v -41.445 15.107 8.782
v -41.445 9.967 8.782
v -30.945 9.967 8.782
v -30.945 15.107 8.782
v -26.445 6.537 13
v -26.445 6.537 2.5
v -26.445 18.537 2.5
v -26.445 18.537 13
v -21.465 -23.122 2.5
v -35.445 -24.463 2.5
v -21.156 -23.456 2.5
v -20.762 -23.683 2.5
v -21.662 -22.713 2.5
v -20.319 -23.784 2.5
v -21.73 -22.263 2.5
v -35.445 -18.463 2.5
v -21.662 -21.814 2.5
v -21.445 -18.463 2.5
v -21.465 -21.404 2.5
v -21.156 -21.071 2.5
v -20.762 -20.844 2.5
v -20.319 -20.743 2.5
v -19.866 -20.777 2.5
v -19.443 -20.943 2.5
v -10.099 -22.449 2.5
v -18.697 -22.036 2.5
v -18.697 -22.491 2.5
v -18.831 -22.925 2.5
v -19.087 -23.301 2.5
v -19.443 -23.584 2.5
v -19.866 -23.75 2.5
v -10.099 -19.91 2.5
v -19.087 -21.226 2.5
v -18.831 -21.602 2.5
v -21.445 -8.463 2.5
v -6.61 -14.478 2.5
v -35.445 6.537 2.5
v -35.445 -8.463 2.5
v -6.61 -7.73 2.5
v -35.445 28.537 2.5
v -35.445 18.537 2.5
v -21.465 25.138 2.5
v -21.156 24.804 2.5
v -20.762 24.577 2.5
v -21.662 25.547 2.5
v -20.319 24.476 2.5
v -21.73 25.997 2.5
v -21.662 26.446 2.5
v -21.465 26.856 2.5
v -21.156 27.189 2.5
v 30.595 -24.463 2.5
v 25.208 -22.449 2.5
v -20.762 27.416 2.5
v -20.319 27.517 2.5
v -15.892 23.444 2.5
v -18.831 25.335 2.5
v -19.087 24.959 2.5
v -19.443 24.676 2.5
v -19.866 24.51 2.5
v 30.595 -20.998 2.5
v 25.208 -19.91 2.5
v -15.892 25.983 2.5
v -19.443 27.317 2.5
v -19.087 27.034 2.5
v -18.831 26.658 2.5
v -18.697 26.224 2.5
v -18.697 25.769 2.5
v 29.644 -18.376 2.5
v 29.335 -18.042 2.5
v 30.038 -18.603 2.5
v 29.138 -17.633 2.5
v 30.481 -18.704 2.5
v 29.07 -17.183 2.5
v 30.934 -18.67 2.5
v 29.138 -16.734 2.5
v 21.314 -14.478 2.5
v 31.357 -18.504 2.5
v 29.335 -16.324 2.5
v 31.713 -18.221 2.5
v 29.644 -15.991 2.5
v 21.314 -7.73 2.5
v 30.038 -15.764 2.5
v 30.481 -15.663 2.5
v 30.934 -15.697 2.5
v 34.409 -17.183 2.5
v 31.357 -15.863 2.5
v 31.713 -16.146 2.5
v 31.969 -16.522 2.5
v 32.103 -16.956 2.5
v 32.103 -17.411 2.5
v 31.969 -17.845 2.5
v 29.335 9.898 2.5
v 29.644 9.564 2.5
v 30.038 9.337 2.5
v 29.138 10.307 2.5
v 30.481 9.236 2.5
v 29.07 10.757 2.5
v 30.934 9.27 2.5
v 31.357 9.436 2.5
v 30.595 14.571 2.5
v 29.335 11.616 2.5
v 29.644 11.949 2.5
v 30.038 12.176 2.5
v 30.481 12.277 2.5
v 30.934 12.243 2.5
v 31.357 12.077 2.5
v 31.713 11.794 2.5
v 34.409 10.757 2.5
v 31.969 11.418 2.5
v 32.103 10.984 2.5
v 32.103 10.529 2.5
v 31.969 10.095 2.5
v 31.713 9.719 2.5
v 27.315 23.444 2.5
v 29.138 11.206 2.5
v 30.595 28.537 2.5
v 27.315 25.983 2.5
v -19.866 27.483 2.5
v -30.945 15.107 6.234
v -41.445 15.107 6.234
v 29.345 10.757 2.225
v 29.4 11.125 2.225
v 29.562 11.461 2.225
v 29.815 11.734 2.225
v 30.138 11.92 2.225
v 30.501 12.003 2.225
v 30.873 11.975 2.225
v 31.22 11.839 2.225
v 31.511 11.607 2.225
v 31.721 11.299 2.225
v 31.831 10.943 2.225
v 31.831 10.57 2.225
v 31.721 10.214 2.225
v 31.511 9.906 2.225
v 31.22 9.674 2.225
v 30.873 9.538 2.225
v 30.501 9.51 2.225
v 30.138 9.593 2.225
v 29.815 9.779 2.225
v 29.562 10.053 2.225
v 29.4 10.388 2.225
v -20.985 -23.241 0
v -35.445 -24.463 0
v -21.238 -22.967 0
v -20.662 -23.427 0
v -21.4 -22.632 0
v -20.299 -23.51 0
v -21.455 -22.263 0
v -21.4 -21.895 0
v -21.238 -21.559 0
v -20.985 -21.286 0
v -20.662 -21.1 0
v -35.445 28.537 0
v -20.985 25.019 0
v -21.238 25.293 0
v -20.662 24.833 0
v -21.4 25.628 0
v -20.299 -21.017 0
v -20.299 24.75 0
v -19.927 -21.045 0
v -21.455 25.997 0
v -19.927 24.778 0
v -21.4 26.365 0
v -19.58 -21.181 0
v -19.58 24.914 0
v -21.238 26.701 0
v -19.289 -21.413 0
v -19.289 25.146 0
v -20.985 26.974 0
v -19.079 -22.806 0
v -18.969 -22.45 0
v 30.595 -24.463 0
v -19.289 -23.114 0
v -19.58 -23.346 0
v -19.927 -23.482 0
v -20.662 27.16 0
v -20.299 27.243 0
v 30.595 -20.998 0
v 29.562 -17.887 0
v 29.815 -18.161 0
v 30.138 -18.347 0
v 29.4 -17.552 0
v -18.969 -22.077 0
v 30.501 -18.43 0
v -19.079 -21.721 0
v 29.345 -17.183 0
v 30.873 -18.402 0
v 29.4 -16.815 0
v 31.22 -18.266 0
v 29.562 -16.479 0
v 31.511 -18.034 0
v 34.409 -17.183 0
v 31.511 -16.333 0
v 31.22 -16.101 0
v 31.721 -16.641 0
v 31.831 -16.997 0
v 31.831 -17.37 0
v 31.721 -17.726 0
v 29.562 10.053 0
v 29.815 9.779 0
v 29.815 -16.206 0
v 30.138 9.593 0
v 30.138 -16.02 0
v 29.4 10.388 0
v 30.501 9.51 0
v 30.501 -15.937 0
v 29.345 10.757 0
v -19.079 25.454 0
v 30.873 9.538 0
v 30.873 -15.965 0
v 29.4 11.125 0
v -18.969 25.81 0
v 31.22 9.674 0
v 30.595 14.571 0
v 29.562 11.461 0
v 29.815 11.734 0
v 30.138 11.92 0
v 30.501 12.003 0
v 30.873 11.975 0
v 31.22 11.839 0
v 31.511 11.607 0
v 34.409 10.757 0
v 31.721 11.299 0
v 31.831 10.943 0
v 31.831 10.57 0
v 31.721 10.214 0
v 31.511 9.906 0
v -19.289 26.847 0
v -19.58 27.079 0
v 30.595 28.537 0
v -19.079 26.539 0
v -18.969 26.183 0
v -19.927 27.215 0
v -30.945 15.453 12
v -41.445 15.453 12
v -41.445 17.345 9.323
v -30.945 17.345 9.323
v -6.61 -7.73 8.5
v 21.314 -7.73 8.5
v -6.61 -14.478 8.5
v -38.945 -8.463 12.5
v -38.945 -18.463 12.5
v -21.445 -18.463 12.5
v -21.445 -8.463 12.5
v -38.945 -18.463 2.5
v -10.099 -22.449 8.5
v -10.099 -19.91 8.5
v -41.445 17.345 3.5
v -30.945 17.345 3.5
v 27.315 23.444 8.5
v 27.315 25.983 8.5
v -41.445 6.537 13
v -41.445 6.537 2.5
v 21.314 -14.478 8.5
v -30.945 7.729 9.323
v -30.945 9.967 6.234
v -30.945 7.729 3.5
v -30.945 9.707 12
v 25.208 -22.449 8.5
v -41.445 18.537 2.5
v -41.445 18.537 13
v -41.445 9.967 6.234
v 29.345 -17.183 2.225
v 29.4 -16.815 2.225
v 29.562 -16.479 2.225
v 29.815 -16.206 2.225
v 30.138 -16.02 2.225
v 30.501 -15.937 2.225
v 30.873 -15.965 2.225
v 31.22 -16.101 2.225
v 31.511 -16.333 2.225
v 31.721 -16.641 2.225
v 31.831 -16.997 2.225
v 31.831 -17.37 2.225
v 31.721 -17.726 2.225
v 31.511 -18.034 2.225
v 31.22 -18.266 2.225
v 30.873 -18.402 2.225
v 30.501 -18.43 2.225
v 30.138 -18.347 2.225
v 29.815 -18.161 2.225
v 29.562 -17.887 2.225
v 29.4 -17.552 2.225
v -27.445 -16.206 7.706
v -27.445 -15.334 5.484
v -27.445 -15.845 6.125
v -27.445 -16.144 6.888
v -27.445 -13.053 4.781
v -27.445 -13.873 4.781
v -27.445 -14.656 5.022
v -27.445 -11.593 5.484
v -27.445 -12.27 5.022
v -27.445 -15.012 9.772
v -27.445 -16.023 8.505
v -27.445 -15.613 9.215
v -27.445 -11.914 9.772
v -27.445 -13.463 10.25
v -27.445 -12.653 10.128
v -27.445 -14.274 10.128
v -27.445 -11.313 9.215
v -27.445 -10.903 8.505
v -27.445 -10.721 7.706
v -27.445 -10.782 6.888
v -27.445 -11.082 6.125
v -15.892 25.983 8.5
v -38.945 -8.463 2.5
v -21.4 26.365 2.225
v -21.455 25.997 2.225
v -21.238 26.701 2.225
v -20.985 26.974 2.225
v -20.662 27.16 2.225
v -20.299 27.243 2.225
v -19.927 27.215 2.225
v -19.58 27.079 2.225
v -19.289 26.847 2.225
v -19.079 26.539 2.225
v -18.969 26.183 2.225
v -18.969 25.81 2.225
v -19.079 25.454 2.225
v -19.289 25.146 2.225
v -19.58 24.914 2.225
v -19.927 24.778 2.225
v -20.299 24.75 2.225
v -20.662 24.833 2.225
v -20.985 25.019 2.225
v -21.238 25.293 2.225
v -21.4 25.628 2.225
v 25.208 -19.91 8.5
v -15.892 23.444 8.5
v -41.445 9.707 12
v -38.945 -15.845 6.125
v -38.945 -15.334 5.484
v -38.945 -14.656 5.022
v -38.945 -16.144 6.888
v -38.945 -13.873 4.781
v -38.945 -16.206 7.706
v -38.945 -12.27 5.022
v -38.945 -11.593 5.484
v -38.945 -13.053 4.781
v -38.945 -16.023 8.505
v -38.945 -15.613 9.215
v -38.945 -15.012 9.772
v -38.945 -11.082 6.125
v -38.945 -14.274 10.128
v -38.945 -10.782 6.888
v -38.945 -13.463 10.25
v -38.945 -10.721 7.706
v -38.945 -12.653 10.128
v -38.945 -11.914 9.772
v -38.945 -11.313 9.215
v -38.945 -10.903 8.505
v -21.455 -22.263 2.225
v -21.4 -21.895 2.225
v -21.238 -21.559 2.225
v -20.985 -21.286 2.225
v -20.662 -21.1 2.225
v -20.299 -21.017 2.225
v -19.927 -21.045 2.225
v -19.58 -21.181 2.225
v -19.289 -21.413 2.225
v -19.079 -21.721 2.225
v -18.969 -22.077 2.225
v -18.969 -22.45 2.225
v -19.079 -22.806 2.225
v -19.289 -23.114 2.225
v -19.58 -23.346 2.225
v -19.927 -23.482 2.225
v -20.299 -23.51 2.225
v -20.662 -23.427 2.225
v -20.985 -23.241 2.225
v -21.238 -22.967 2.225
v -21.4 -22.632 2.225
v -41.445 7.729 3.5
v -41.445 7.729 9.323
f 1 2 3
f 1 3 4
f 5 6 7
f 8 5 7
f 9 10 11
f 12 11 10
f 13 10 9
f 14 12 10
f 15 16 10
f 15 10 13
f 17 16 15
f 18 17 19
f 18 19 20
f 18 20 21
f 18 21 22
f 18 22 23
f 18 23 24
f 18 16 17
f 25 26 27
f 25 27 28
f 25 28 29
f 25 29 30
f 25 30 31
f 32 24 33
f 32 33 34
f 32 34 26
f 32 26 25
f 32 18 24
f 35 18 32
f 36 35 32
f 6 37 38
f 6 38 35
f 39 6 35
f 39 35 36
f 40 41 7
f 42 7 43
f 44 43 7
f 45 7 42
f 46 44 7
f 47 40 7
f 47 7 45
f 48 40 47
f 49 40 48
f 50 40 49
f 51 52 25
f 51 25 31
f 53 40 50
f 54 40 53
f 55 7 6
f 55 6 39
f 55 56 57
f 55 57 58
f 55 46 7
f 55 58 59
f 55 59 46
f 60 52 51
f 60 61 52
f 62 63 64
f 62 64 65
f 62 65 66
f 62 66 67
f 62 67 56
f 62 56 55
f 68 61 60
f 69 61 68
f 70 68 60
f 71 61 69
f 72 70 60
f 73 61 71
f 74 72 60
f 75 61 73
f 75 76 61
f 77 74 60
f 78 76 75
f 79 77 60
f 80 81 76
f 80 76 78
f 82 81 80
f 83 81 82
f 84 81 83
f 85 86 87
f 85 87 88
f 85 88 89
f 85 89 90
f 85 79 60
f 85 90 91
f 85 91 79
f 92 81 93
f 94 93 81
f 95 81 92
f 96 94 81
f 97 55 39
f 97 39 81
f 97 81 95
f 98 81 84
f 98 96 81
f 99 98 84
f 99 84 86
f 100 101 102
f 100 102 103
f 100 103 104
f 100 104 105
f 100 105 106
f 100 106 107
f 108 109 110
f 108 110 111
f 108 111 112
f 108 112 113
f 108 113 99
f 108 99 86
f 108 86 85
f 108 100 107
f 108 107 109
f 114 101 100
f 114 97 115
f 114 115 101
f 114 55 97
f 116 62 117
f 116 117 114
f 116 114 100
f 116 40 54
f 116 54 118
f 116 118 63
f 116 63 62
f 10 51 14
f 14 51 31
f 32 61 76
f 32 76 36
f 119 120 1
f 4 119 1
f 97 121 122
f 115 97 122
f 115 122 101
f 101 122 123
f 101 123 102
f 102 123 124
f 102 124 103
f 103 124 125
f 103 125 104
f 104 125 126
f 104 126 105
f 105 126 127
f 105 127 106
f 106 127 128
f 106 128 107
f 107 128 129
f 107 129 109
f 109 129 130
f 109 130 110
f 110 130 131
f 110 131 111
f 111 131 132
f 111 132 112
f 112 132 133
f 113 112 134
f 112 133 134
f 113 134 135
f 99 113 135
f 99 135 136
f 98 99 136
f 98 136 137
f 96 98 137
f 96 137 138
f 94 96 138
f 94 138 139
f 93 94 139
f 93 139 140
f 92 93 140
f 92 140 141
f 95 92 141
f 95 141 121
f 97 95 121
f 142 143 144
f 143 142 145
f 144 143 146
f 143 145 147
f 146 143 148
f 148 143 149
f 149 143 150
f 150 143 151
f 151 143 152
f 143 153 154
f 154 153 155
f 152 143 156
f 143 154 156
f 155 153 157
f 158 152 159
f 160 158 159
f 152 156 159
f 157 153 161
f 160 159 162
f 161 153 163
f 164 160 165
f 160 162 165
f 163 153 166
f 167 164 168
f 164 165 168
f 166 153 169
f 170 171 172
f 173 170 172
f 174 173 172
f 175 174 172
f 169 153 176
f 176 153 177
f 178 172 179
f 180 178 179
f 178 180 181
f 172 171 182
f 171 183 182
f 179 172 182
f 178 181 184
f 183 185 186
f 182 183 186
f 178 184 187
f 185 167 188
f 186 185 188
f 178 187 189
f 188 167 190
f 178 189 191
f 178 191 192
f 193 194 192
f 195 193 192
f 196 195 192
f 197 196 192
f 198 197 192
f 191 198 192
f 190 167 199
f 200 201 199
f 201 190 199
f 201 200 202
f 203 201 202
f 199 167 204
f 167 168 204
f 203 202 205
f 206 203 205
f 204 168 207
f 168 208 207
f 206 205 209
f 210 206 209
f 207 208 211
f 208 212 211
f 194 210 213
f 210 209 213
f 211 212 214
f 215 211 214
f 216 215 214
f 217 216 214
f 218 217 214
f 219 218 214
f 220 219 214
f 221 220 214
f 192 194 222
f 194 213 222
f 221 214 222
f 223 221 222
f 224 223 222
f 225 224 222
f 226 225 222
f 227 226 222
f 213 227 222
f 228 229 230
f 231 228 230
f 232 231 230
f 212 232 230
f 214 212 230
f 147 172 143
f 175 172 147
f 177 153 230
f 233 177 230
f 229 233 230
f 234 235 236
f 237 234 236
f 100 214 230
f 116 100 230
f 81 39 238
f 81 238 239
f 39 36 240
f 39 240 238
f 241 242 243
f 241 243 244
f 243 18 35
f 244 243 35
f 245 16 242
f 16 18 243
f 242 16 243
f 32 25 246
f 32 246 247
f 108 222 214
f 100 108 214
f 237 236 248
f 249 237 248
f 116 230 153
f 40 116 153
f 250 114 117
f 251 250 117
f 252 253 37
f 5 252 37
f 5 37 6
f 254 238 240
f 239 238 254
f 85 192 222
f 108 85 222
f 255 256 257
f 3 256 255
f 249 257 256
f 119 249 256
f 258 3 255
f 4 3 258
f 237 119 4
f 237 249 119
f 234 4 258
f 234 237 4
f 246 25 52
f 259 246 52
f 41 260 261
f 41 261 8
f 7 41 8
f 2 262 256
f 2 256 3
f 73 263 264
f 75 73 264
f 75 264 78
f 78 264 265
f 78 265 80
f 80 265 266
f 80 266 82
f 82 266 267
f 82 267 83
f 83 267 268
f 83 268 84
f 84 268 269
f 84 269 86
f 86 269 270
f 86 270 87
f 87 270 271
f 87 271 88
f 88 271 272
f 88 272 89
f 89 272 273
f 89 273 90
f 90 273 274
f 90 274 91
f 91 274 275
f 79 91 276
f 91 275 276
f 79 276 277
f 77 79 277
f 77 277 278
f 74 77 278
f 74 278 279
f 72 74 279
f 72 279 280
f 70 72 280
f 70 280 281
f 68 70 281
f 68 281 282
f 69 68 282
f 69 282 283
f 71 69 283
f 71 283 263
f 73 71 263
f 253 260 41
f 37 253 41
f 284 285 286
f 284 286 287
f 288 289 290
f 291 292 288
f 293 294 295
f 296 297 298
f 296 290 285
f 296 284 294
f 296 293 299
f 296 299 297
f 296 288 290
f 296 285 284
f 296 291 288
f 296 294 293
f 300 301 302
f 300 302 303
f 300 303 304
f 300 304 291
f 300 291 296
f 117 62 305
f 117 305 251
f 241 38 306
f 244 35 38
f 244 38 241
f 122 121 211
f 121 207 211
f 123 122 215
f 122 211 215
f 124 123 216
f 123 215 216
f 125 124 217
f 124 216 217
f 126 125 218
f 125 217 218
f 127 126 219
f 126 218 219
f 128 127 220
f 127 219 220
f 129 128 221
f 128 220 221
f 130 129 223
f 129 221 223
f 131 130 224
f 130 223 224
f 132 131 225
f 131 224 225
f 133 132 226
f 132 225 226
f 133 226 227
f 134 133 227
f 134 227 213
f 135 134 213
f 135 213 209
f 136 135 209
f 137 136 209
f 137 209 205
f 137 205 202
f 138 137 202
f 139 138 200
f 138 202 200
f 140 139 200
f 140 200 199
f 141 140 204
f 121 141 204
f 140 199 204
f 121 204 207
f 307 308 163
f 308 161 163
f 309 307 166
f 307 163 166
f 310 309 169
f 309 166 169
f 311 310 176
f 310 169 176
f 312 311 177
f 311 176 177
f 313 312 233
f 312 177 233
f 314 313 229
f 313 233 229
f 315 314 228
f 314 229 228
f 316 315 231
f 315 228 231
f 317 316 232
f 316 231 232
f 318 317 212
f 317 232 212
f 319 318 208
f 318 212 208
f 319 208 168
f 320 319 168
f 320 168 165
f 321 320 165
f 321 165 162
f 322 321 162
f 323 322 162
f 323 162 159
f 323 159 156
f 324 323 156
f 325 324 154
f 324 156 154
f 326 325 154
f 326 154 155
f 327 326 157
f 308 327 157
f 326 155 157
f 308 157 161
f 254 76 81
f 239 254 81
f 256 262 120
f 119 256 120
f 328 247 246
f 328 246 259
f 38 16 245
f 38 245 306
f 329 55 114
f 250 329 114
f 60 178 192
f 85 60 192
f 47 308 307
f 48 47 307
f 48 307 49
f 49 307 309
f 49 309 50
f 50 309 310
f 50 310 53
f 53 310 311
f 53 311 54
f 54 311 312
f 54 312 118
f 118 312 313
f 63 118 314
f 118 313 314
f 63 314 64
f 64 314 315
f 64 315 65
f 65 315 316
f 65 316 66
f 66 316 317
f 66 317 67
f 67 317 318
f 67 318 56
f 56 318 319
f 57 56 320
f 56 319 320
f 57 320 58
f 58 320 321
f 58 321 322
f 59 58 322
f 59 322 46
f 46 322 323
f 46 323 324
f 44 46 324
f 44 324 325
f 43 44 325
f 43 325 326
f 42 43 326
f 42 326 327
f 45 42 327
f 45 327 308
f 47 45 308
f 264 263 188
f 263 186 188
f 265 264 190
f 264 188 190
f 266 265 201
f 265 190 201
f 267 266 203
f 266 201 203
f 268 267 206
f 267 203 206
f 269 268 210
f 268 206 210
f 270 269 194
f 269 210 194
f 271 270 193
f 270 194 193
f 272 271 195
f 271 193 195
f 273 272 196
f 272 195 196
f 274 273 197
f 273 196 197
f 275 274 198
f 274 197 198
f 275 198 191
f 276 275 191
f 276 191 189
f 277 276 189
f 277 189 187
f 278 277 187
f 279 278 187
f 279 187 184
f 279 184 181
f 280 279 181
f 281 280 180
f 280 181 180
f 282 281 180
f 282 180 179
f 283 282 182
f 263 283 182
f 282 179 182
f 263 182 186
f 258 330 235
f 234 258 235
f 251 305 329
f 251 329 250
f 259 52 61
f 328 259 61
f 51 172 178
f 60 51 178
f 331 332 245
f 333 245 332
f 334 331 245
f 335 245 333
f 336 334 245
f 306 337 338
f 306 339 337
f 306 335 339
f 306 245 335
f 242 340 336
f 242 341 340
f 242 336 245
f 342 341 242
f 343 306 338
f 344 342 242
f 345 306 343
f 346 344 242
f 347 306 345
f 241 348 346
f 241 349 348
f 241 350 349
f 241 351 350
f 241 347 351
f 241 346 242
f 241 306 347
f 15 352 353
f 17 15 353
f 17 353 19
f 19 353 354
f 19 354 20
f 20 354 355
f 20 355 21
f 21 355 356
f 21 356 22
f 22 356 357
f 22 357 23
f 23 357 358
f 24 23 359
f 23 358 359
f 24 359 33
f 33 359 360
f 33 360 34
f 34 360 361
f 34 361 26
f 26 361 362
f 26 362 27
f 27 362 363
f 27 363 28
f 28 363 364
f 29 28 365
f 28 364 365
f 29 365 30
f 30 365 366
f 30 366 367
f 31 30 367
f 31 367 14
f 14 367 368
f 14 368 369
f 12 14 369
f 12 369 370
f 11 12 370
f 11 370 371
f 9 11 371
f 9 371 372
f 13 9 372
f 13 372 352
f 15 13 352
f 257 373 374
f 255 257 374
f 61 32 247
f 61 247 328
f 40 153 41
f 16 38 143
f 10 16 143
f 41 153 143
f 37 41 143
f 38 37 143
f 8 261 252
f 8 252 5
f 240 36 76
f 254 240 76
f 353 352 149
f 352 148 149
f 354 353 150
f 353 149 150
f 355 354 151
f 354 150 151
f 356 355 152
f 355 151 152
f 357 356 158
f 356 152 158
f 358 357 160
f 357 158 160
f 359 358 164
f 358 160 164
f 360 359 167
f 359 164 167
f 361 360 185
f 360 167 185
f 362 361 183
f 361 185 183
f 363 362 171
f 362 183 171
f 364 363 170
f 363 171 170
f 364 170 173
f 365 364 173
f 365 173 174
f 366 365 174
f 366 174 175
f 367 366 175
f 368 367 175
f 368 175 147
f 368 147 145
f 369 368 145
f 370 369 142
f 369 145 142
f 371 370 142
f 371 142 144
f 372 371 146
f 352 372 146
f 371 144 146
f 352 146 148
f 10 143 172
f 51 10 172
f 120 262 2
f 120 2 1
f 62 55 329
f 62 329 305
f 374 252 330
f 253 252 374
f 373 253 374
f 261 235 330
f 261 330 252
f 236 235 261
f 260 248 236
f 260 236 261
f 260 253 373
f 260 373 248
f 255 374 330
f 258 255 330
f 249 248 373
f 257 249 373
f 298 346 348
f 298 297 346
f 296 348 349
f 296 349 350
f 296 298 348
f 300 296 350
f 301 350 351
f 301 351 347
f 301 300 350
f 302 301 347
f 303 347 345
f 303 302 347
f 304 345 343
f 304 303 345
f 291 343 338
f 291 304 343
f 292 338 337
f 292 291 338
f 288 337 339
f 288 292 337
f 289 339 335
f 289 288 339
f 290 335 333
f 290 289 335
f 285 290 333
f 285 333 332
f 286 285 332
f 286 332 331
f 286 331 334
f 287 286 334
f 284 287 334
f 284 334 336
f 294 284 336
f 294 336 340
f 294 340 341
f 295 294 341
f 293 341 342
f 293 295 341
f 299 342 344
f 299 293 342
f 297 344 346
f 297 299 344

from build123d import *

# Parameters (mm, degrees)
EXTRUDE_1_DEPTH              = 2.5
HOLE_WIZARD_M3_1_D           = 2.5
HOLE_WIZARD_M3_1_CSINK_D     = 3.05
HOLE_WIZARD_M3_1_CSINK_ANGLE = 90
SKETCH_8_W                   = 27.92487284
SKETCH_8_H                   = 6.74765502
SKETCH_8_W_2                 = 35.307317085
SKETCH_8_H_2                 = 2.5392143
SKETCH_8_W_3                 = 43.206671158
EXTRUDE_2_DEPTH              = 6
SKETCH_9_W                   = 15
SKETCH_9_H                   = 12
EXTRUDE_3_DEPTH              = 10.5
SKETCH_10_W                  = 2.54775384
SKETCH_10_H                  = 5.1401971
CUT_EXTRUDE_1_DEPTH          = 10.5
SKETCH_12_W                  = 14
SKETCH_12_H                  = 10
EXTRUDE_4_DEPTH              = 10
SKETCH_13_W                  = 10
SKETCH_13_H                  = 10
SKETCH_13_R                  = 2.75
EXTRUDE_5_DEPTH              = 3.5
SKETCH_14_R                  = 2.75
CUT_EXTRUDE_3_DEPTH          = 8


with BuildPart() as part:
    # 草图1 → 凸台-拉伸1 (new body)
    with BuildSketch(Plane.XY):
        Polygon((-35.4452235, 28.536703393), (-35.4452235, -24.463296607), (30.5947765, -24.463296607), (30.5947765, -20.997866899), (34.409346792, -17.183296607), (34.409346792, 10.756703393), (30.5947765, 14.571273684), (30.5947765, 28.536703393), align=None)
    extrude(amount=EXTRUDE_1_DEPTH)

    # M3 螺纹孔1 (through all)
    with Locations(Plane.XY.offset(2.5)):
        with Locations((-20.2052235, 25.996703393), (30.5947765, 10.756703393), (30.5947765, -17.183296607), (-20.2052235, -22.263296607)):
            CounterSinkHole(HOLE_WIZARD_M3_1_D / 2, HOLE_WIZARD_M3_1_CSINK_D / 2, counter_sink_angle=HOLE_WIZARD_M3_1_CSINK_ANGLE)

    # 草图8 → 凸台-拉伸2 (add)
    with BuildSketch(Plane.XY.offset(2.5)):
        with Locations((7.351969456, -11.104054762)):
            Rectangle(SKETCH_8_W, SKETCH_8_H)
        with Locations((7.55461376, -21.179250047)):
            Rectangle(SKETCH_8_W_2, SKETCH_8_H_2)
        with Locations((5.71151473, 24.713414732)):
            Rectangle(SKETCH_8_W_3, SKETCH_8_H_2)
    extrude(amount=EXTRUDE_2_DEPTH)

    # 草图9 → 凸台-拉伸3 (add)
    with BuildSketch(Plane.XY.offset(2.5)):
        with Locations((-33.9452235, 12.536703393)):
            Rectangle(SKETCH_9_W, SKETCH_9_H)
    extrude(amount=EXTRUDE_3_DEPTH)

    # 草图10 → 切除-拉伸1 (cut)
    with BuildSketch(Plane.ZY.offset(41.4452235)):
        Polygon((3.5, 17.344772898), (3.5, 7.728633887), (9.323306646, 7.728633887), (12, 9.706966862), (12, 15.452627596), (9.323306646, 17.344772898), align=None)
        with Locations((7.507872917, 12.536703393)):
            Rectangle(SKETCH_10_W, SKETCH_10_H, mode=Mode.SUBTRACT)
    extrude(amount=-CUT_EXTRUDE_1_DEPTH, mode=Mode.SUBTRACT)

    # 草图12 → 凸台-拉伸4 (add)
    with BuildSketch(Plane.XY.offset(2.5)):
        with Locations((-28.4452235, -13.463296607)):
            Rectangle(SKETCH_12_W, SKETCH_12_H)
    extrude(amount=EXTRUDE_4_DEPTH)

    # 草图13 → 凸台-拉伸5 (add)
    with BuildSketch(Plane.ZY.offset(35.4452235)):
        with Locations((7.5, -13.463296607)):
            Rectangle(SKETCH_13_W, SKETCH_13_H)
        with Locations((7.5, -13.463296607)):
            Circle(SKETCH_13_R, mode=Mode.SUBTRACT)
    extrude(amount=EXTRUDE_5_DEPTH)

    # 草图14 → 切除-拉伸3 (cut)
    with BuildSketch(Plane.ZY.offset(35.4452235)):
        with Locations((7.5, -13.463296607)):
            Circle(SKETCH_14_R)
    extrude(amount=-CUT_EXTRUDE_3_DEPTH, mode=Mode.SUBTRACT)


solid = part.part
